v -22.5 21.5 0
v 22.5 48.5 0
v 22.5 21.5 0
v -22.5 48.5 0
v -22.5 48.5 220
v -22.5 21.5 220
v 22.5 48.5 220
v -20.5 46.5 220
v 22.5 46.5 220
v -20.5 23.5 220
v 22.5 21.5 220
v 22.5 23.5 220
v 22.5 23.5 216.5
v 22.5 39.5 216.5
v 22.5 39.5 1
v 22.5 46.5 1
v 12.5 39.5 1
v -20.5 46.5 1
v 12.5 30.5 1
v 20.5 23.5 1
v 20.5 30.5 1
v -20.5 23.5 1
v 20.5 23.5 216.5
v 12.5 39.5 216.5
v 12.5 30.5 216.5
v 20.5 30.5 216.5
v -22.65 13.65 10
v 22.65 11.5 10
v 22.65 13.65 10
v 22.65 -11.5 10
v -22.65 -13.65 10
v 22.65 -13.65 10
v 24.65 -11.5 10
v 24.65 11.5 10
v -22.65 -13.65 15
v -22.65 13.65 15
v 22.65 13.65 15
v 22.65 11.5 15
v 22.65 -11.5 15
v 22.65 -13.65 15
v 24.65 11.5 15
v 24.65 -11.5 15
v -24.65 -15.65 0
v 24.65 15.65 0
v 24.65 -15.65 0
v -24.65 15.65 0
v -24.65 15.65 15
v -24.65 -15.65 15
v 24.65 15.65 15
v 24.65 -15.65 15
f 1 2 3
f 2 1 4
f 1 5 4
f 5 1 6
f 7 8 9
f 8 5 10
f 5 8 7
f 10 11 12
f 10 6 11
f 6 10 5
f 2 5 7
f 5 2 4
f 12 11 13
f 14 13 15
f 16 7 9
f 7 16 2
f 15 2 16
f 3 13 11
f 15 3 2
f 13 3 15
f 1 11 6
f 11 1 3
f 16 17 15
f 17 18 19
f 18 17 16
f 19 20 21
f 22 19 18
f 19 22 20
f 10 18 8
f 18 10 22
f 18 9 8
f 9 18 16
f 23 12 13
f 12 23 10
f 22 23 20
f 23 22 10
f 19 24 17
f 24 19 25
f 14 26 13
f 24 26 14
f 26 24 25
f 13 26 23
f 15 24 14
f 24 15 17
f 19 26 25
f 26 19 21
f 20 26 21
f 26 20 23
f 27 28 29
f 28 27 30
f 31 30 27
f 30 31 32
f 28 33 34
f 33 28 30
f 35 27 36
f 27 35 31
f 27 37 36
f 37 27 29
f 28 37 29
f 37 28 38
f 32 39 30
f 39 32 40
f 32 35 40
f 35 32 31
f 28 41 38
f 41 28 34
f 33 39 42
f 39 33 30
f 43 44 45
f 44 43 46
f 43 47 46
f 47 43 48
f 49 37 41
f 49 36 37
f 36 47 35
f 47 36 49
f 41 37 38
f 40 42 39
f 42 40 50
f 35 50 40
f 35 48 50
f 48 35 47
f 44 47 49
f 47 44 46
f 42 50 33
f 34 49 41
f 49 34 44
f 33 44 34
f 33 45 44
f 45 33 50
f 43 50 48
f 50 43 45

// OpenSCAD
$fn = 100;

total_height = 230;
base_height = 10;

module outer_wall(height) {
  linear_extrude(height) square([45, 27], center=true);
}

module inner_wall(height) {
  linear_extrude(height) square([45, 23], center=true);
}

module pillar(height, connect_right) {
  translate([17.5, 0, 0]) linear_extrude(height) square([10, 9], center=true);
  translate([21.5, connect_right ? -8 : 8, 0]) linear_extrude(height) square([2, 10], center=true);
}

module magazine(height) {
  difference() {
    outer_wall(height);
    translate([2, 0, 1]) inner_wall(height);
  }
  pillar(height - 3.5, true);
}

module base_outer_wall(height) {
  linear_extrude(height) square([49.3, 31.3], center=true);
}

module base_inner_wall(height) {
  linear_extrude(height) square([45.3, 27.3], center=true);
}

module base_cutout() {
  translate([0, 0, 0]) base_inner_wall(30);
  translate([5, 0, 0]) linear_extrude(30) square([45, 23], center=true);
}

module base(height) {
  rail_height = 5;
  difference() {
    base_outer_wall(height + rail_height);
    translate([0, 0, height]) base_cutout();
  }
}

translate([0, 35, 0]) magazine(total_height - base_height);
base(base_height);
